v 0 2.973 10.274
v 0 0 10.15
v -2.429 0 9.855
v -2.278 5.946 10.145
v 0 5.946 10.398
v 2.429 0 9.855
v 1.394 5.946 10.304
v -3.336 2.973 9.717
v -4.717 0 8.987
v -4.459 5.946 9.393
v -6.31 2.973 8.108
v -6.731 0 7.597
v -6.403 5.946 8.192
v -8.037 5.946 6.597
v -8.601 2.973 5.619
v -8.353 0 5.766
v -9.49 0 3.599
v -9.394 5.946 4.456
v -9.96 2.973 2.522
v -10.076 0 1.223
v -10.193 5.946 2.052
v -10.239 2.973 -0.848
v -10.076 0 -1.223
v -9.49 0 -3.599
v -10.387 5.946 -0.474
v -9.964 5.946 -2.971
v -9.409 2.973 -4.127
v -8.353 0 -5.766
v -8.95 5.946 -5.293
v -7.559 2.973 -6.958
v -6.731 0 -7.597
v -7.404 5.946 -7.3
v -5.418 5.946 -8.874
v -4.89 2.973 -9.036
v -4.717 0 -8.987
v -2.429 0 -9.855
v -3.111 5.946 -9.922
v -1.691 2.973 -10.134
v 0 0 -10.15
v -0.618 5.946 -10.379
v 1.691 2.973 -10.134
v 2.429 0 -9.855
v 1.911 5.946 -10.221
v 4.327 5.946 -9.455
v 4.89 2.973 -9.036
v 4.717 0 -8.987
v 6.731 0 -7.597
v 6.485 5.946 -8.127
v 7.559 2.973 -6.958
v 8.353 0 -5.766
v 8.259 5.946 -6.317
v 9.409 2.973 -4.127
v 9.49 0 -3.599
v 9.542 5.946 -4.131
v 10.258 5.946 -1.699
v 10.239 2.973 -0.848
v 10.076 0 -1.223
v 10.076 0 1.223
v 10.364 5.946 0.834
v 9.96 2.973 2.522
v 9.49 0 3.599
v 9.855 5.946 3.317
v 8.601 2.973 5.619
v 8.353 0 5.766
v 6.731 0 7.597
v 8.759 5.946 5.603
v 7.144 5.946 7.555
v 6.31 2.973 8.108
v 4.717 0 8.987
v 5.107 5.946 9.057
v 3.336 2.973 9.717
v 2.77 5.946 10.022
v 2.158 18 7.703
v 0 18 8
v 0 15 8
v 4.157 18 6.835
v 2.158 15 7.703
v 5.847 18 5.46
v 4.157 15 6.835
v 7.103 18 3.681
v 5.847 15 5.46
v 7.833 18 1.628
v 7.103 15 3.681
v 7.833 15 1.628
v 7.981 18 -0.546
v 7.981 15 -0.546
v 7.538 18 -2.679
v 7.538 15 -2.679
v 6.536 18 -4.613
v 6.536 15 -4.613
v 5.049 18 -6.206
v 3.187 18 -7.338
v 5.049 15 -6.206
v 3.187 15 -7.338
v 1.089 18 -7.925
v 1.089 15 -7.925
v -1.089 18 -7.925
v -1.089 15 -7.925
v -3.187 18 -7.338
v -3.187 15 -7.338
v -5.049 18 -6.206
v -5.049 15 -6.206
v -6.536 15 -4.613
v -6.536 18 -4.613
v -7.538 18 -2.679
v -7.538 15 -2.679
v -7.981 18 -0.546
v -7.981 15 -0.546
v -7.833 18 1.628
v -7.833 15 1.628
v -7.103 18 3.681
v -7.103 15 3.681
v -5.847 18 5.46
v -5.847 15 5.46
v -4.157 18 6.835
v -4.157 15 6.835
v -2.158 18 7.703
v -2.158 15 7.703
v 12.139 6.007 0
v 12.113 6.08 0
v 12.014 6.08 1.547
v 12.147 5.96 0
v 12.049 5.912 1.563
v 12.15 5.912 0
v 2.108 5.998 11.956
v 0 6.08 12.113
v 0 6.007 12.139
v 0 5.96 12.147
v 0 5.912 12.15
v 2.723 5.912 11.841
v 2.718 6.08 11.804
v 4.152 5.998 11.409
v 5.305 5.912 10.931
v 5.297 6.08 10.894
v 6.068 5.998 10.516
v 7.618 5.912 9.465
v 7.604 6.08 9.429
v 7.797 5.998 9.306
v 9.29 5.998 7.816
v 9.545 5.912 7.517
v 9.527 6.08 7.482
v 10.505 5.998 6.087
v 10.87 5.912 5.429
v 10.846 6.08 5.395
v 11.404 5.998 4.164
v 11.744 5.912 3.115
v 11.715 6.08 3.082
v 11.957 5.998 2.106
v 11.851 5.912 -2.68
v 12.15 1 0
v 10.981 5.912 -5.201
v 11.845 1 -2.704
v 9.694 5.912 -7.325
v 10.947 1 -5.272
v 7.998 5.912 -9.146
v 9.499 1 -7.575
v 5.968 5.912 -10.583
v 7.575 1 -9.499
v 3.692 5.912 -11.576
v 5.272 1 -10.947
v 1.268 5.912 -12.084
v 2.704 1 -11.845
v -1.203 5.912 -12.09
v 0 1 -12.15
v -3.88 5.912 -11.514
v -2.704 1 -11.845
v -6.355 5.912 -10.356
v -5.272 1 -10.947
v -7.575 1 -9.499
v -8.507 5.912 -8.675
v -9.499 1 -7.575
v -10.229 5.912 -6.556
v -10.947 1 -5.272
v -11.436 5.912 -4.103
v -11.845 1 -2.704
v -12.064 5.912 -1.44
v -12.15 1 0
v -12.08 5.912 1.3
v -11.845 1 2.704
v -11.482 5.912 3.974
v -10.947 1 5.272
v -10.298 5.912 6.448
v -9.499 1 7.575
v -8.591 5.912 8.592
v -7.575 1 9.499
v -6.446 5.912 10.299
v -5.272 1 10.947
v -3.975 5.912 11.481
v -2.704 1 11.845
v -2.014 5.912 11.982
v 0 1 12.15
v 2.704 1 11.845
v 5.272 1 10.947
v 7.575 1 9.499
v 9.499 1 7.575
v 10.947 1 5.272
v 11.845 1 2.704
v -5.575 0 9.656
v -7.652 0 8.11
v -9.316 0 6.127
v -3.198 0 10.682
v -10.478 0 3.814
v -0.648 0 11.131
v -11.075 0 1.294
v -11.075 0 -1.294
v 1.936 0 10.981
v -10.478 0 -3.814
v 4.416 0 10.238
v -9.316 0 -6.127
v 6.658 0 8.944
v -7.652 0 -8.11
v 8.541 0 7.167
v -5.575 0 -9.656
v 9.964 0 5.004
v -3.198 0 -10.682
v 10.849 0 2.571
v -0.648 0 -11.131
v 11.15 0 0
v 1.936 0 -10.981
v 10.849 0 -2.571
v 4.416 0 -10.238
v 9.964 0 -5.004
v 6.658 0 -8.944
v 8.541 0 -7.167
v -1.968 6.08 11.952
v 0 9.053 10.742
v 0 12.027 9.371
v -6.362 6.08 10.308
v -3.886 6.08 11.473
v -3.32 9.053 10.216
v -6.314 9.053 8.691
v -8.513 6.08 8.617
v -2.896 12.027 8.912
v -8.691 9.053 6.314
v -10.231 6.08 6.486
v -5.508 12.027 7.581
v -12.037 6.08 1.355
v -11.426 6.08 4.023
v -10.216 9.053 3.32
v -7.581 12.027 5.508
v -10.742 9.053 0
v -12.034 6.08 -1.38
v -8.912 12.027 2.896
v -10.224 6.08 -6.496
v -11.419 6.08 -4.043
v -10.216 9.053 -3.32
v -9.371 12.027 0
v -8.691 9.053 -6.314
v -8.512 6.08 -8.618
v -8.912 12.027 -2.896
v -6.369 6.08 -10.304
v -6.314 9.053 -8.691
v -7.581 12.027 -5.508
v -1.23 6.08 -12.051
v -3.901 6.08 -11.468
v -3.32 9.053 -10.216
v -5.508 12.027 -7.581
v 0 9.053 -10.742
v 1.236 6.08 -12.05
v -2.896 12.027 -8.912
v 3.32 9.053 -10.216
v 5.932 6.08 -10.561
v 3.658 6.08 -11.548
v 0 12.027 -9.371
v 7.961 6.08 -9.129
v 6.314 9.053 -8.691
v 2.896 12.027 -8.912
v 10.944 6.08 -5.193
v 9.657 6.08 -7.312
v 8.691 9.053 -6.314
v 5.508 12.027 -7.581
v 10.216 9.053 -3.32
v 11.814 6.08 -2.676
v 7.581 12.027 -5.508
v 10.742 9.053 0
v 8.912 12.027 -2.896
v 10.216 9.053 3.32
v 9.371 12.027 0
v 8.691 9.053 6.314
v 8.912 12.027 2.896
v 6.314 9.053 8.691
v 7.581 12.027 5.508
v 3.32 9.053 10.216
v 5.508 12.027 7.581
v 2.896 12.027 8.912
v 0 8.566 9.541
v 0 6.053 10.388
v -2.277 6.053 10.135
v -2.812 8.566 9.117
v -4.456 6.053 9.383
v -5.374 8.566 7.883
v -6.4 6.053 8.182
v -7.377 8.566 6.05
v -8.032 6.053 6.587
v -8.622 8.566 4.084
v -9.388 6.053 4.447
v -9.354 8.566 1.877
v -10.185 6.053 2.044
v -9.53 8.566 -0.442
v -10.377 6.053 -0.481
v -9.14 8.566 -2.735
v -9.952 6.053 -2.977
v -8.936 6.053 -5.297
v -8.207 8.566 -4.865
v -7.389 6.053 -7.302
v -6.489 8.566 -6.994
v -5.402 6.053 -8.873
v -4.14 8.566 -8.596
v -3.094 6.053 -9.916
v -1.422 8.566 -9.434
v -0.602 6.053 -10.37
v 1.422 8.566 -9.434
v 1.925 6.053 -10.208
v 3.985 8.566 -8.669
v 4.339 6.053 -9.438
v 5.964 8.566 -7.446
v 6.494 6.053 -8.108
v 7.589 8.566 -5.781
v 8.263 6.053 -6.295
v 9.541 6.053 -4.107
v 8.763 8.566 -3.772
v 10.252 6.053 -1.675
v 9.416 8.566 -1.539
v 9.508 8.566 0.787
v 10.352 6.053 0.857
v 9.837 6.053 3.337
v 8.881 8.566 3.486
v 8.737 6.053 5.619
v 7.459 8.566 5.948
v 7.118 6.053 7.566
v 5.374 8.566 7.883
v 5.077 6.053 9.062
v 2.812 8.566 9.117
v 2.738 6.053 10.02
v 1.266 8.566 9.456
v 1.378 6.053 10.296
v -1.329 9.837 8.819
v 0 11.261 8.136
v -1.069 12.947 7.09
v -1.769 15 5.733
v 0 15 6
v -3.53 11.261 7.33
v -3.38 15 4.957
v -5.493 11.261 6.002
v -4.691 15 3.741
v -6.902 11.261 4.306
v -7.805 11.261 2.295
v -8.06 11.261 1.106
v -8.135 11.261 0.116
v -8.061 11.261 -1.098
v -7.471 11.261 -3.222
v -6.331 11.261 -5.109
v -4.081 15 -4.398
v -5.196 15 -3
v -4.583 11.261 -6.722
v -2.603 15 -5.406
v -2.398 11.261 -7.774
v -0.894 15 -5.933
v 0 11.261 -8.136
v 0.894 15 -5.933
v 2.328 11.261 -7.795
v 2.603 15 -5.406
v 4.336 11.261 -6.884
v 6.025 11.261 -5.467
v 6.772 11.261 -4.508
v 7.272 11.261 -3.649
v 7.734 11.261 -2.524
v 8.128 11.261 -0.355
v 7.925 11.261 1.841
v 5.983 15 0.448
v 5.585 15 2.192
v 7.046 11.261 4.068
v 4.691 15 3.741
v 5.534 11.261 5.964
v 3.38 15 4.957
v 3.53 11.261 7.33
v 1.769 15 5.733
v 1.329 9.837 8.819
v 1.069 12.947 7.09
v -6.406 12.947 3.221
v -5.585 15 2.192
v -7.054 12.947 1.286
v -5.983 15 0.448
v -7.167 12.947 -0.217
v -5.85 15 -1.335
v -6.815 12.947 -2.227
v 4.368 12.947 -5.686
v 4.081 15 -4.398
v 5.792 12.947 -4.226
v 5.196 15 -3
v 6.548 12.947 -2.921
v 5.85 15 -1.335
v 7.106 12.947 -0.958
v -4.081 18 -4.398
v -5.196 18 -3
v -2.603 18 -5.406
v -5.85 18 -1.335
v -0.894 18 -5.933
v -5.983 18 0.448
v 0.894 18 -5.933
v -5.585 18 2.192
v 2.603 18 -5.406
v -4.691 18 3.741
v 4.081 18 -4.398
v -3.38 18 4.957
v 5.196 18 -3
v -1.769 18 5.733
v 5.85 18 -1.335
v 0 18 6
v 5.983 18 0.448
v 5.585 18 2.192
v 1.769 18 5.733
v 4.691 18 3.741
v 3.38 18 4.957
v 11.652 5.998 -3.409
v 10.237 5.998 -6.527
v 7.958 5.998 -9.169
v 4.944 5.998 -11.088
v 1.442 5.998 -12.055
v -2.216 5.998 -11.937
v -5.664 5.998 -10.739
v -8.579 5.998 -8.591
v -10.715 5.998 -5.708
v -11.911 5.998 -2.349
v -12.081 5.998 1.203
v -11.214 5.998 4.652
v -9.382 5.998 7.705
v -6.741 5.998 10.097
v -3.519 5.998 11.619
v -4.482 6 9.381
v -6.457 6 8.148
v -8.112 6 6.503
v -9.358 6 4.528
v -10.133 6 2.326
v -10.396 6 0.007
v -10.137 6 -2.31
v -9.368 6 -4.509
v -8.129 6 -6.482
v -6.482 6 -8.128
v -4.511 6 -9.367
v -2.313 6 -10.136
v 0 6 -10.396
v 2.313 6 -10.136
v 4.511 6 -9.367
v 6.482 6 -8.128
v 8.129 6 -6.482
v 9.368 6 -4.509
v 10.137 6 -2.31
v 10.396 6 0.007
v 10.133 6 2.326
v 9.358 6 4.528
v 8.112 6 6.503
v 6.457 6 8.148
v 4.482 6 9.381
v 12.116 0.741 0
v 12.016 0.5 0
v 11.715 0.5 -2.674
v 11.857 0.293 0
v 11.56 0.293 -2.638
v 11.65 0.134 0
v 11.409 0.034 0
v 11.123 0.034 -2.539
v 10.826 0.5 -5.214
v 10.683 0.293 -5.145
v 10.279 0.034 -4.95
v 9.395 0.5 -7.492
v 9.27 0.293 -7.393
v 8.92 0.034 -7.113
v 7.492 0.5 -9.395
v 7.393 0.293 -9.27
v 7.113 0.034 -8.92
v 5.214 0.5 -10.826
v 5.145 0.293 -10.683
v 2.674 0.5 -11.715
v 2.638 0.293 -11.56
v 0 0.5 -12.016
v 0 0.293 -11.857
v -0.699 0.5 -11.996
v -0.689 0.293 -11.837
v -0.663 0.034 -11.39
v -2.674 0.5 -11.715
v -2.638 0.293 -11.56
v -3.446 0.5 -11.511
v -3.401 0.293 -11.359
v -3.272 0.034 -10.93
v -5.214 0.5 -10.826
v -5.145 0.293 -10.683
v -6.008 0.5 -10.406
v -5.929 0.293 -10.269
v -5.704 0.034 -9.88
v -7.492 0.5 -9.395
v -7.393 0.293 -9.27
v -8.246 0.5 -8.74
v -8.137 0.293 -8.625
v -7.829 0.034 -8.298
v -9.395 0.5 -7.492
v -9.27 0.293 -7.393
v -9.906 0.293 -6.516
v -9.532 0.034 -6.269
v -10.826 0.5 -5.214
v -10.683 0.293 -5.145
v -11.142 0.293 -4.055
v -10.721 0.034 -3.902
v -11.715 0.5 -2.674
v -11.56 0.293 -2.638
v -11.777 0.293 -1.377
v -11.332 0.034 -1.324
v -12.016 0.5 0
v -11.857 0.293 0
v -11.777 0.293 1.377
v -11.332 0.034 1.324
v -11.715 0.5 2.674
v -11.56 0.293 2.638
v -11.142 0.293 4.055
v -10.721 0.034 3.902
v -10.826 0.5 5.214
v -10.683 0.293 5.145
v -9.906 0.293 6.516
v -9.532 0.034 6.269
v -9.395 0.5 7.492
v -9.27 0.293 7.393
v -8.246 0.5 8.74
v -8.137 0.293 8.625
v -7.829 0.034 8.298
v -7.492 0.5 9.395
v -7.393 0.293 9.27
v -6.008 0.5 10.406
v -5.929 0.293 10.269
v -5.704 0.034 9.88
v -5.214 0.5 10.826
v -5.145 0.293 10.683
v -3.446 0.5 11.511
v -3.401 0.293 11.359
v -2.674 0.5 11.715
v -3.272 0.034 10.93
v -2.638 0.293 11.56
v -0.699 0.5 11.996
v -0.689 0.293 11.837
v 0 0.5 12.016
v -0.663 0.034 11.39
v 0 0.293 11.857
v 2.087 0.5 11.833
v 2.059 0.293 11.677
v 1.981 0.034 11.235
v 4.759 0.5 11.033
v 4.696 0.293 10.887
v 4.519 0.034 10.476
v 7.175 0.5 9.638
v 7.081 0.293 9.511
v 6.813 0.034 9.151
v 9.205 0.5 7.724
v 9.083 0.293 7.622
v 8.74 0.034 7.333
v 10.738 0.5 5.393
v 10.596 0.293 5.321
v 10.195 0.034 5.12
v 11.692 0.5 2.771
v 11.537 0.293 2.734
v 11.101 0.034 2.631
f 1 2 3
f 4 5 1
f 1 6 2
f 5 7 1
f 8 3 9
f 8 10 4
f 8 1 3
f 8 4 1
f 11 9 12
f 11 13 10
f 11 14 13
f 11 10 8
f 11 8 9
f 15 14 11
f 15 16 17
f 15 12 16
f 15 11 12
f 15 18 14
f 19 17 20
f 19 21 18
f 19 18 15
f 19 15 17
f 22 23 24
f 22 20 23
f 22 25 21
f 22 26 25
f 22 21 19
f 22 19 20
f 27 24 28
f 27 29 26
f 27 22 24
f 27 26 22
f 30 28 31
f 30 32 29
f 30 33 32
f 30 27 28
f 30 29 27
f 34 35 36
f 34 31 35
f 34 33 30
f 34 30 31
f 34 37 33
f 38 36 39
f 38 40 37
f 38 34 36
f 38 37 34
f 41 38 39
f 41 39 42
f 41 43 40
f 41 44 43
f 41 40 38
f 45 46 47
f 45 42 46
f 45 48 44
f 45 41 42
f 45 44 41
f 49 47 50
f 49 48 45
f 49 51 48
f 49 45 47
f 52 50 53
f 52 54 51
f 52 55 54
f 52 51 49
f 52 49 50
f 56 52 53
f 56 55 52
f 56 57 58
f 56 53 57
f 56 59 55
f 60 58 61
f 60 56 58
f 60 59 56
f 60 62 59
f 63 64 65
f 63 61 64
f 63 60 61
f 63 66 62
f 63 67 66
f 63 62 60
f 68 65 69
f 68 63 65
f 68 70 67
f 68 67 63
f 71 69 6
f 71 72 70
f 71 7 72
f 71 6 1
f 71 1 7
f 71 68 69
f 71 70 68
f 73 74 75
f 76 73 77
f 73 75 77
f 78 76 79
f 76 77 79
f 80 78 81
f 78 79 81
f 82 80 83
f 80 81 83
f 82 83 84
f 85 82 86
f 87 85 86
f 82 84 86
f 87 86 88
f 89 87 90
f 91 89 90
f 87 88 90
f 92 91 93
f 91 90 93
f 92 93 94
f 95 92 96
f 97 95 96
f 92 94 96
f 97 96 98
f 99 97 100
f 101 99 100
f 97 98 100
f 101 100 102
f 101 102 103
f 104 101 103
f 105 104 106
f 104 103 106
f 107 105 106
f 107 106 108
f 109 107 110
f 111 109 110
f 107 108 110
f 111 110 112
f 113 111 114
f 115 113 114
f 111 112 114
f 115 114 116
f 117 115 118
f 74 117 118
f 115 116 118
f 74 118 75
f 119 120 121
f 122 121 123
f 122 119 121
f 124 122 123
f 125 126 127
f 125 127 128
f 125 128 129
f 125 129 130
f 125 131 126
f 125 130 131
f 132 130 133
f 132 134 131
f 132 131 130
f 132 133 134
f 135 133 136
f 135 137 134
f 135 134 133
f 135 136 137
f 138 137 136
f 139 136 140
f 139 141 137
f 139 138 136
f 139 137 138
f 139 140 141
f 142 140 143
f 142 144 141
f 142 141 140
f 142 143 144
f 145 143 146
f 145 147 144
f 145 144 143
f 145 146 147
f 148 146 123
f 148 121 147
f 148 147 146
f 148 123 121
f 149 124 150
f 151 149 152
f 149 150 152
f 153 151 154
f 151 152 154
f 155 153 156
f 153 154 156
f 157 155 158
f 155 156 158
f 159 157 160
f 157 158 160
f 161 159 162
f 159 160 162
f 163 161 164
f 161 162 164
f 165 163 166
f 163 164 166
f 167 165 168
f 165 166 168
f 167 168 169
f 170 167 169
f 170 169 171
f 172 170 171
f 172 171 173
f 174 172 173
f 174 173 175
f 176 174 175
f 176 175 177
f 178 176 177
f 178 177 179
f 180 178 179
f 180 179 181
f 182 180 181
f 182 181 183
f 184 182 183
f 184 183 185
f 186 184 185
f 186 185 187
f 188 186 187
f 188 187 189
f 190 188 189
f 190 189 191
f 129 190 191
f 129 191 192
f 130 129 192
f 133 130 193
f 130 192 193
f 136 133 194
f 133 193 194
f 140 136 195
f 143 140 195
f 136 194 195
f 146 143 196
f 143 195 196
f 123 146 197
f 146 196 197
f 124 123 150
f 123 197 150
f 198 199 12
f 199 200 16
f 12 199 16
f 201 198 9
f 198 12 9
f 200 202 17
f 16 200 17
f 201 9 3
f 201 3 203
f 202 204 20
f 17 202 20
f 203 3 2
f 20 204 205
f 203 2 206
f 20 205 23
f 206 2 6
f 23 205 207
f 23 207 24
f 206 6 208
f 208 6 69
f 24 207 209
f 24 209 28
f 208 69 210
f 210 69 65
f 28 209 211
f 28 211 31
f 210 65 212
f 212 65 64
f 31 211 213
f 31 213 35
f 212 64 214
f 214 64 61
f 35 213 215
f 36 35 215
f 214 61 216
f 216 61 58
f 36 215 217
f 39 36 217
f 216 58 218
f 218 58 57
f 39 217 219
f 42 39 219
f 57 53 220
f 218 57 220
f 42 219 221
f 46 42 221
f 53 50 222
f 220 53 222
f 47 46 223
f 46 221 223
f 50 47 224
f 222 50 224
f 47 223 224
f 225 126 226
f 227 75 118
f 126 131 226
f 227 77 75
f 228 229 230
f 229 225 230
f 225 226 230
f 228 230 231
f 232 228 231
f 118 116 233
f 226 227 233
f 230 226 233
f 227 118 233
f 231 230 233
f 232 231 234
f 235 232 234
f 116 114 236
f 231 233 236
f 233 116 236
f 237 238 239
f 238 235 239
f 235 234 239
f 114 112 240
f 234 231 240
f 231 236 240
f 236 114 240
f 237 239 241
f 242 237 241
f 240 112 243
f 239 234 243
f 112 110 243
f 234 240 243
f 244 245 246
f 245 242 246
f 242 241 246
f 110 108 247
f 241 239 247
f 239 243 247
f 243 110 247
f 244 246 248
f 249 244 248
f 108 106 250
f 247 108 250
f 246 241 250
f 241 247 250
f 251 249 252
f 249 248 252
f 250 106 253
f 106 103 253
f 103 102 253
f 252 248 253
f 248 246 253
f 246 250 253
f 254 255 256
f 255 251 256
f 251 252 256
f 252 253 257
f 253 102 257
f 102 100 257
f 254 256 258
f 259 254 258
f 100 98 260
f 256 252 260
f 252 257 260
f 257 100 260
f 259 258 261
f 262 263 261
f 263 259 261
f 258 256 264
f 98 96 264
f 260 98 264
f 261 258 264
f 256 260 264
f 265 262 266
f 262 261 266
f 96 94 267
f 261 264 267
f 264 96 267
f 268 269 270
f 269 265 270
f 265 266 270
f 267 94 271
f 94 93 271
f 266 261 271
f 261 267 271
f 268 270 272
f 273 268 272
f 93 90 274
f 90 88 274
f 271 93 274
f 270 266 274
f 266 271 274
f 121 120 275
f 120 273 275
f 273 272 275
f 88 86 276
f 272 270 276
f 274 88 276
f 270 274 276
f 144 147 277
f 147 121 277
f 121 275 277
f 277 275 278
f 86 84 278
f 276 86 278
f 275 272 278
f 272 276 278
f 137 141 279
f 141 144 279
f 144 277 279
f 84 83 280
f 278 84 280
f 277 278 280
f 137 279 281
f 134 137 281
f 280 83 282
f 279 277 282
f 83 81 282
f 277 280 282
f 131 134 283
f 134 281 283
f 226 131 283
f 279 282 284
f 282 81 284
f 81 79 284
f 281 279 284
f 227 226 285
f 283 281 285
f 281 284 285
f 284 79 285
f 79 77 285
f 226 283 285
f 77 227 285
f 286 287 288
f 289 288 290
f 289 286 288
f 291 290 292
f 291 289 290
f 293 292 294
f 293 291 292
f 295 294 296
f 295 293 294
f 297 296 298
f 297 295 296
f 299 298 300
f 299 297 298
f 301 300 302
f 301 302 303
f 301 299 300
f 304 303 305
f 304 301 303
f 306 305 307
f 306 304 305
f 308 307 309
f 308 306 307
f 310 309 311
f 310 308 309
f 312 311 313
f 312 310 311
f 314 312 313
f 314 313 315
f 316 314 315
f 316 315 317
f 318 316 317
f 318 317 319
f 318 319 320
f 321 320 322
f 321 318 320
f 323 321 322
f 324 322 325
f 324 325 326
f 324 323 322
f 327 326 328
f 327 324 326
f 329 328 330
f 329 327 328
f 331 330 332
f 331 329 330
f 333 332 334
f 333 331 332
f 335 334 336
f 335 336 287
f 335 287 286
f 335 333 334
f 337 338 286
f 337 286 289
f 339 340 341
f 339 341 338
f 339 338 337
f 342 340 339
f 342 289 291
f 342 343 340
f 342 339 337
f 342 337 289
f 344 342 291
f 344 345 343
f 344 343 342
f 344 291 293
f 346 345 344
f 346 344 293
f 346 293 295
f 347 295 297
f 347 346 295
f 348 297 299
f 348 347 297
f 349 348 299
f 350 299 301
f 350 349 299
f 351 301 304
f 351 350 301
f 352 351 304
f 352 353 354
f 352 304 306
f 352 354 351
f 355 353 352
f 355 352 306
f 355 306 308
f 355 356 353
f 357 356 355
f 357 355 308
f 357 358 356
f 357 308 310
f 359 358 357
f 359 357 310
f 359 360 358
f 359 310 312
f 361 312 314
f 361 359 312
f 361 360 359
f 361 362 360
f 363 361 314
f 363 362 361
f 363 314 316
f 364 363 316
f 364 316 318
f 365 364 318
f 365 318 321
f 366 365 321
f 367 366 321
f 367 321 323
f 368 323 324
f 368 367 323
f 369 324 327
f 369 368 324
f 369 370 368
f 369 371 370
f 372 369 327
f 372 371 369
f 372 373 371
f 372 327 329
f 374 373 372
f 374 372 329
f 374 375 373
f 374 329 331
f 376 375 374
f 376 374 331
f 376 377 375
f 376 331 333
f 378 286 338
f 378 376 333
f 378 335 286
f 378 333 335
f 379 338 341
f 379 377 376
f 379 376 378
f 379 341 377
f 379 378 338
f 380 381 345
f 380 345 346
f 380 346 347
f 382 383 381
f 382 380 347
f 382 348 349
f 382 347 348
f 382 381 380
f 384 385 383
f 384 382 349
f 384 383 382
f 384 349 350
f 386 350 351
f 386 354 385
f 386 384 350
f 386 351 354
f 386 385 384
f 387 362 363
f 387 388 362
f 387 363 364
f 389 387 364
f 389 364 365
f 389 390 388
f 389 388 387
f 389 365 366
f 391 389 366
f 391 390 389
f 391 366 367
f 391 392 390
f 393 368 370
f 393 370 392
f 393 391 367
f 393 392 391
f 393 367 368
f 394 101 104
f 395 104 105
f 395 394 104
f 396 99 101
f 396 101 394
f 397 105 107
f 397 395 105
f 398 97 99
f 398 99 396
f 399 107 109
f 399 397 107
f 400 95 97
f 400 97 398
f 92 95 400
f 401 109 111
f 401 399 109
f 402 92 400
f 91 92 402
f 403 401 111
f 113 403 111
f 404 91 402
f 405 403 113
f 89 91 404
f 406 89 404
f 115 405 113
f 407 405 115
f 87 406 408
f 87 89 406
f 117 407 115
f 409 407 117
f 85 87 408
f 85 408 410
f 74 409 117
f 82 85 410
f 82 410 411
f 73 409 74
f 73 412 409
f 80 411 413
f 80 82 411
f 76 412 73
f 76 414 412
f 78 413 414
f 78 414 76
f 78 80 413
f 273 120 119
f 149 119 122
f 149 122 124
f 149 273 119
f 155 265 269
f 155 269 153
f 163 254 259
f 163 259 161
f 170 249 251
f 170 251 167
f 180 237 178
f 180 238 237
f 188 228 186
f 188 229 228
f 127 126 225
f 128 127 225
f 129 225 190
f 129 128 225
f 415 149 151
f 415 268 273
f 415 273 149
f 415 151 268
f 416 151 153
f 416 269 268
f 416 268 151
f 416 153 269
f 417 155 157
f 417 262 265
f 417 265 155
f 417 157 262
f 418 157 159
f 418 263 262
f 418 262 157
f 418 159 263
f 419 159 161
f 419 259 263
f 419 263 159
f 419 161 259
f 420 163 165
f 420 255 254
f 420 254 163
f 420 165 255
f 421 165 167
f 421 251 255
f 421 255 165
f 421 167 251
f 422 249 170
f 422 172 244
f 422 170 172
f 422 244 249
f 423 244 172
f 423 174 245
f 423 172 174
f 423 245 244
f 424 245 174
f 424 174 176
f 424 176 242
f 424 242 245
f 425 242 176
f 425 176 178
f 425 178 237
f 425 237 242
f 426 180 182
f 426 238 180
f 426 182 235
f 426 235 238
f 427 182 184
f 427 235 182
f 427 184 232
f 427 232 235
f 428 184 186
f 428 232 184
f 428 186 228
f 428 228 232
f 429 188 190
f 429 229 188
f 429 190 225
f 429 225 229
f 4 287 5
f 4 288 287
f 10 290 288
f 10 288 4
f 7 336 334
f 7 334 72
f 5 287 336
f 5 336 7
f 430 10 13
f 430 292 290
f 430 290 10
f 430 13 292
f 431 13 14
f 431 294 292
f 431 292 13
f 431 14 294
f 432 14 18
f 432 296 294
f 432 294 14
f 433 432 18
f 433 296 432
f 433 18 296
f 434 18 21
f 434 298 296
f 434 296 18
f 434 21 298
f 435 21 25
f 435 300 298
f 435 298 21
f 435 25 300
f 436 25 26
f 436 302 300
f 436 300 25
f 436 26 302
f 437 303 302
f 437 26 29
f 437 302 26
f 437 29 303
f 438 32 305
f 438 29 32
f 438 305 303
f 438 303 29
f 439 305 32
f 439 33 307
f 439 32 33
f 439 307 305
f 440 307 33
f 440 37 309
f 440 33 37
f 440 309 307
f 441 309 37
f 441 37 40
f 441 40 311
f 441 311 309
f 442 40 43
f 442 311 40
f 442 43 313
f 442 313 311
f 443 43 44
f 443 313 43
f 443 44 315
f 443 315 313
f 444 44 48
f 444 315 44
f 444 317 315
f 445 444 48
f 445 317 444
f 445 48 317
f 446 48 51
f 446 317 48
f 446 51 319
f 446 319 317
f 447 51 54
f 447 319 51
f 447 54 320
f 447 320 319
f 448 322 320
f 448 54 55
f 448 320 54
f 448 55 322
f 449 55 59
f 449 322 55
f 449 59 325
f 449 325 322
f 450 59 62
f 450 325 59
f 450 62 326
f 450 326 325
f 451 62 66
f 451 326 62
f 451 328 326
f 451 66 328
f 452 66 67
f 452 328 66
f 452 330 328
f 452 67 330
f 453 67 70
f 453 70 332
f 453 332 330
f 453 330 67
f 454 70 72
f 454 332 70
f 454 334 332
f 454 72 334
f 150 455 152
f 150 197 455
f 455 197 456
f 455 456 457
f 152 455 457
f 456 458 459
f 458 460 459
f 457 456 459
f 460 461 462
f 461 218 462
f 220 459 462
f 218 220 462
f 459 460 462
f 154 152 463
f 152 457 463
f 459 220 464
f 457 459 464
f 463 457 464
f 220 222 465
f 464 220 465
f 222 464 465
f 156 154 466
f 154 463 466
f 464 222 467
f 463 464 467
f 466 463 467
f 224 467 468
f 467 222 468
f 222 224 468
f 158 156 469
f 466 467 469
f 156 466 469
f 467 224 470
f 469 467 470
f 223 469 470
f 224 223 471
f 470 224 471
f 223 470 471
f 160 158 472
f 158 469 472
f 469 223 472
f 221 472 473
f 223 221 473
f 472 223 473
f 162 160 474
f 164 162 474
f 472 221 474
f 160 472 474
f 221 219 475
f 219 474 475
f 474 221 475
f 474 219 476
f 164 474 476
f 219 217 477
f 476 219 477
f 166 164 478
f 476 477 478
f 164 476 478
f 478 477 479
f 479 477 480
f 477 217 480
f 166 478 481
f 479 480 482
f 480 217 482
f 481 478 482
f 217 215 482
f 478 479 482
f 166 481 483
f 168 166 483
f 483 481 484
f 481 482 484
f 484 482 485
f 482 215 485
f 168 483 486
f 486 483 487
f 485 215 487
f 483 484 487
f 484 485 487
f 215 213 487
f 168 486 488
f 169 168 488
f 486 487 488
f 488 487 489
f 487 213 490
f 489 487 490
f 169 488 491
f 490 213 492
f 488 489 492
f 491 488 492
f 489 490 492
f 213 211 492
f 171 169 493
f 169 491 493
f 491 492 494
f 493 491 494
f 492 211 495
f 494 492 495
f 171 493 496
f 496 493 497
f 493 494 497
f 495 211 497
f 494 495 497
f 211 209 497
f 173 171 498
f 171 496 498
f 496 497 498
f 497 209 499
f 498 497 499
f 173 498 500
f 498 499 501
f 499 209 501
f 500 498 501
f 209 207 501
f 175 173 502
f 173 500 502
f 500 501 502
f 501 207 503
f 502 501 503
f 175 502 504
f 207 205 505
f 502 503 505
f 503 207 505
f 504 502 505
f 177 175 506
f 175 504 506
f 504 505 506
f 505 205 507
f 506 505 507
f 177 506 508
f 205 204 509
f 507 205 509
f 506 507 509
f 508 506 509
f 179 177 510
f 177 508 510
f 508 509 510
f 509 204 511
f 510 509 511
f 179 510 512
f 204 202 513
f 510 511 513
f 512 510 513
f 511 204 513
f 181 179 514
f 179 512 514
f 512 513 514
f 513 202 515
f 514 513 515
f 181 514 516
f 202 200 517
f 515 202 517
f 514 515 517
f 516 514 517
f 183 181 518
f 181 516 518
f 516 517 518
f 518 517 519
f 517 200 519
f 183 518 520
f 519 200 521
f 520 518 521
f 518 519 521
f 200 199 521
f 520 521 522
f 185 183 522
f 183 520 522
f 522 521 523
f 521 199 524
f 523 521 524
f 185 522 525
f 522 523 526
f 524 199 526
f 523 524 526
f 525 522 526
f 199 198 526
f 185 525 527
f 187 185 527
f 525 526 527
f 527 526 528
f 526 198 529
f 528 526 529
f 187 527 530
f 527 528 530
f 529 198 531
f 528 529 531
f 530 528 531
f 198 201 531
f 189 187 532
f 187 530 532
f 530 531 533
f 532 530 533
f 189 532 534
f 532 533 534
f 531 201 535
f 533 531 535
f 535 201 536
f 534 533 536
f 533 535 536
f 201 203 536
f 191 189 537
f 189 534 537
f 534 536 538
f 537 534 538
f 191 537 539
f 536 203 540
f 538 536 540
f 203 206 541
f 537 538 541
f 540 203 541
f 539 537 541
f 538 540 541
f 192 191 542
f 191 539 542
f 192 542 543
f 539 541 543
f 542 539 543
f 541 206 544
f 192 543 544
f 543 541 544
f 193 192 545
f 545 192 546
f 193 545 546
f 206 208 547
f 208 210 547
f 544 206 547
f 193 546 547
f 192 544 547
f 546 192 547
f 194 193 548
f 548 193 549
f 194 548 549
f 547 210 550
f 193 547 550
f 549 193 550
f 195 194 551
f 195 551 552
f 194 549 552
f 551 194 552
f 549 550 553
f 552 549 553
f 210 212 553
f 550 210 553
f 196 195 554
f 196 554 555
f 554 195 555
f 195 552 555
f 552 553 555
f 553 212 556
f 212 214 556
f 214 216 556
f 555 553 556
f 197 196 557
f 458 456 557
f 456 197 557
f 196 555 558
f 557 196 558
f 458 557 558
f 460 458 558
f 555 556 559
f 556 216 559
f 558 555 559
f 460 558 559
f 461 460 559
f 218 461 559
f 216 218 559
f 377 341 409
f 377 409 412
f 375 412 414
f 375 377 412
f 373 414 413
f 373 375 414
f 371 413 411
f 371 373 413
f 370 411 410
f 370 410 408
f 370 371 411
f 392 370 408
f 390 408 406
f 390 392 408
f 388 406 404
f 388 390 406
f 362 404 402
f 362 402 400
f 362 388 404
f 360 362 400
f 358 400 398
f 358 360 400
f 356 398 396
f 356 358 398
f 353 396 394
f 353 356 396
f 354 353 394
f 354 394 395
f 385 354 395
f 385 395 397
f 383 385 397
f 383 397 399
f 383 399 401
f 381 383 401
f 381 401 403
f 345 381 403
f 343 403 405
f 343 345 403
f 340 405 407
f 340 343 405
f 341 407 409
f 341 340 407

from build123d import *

# Parameters (mm, degrees)
SZKIC1_R                          = 12.15
SZKIC1_R_2                        = 10.15
WYCI_GNI_CIE_CIENKA_CIANKA1_DEPTH = 6
ZAOKR_GLENIE2_R                   = 1
ZAOKR_GLENIE3_R                   = 0.4
SZKIC6_R                          = 8
SZKIC6_R_2                        = 6
DODANIE_WYCI_GNI_CIE1_DEPTH       = 3


with BuildPart() as part:
    # Szkic1 → Wyciągnięcie-cienka ścianka1 (new body)
    with BuildSketch(Plane(origin=(0, 0, 0), x_dir=(1, 0, 0), z_dir=(0, 1, 0))):
        Circle(SZKIC1_R)
        Circle(SZKIC1_R_2, mode=Mode.SUBTRACT)
    extrude(amount=WYCI_GNI_CIE_CIENKA_CIANKA1_DEPTH)

    # Zaokrąglenie2
    zaokr_glenie2_edges = [part.edges().sort_by_distance(p)[0] for p in [
        (-12.15, 0, 0),
    ]]
    fillet(zaokr_glenie2_edges, radius=ZAOKR_GLENIE2_R)

    # Szkic4 → Wycięcie-obrót1 (revolve, cut)
    with BuildSketch(Plane(origin=(0, 0, 0), x_dir=(0, 0, -1), z_dir=(1, 0, 0)), mode=Mode.PRIVATE) as wyci_cie_obr_t1_sk:
        Polygon((0, 0), (10.15, 0), (10.4, 6), (0, 6), align=None)
    revolve(wyci_cie_obr_t1_sk.sketch.rotate(Axis((0, 6, 0), (0, -1, 0)), 180), axis=Axis((0, 6, 0), (0, -1, 0)), mode=Mode.SUBTRACT)

    # Szkic5 → Obrót1 (revolve)
    with BuildSketch(Plane(origin=(0, 0, 0), x_dir=(0, 0, -1), z_dir=(1, 0, 0)), mode=Mode.PRIVATE) as obr_t1_sk:
        with BuildLine():
            add(Edge.make_bspline(
                [(10.4, 6), (9.777490232, 8.738978154), (8.575284138, 10.423413973), (6, 15)],
                knots=[0, 0, 0, 0, 1, 1, 1, 1], degree=3))
            Line((10.4, 6), (12.15, 6))
            Line((12.15, 6), (8, 15))
            Line((8, 15), (6, 15))
        make_face()
    revolve(obr_t1_sk.sketch.rotate(Axis((0, 15, 0), (0, -1, 0)), 180), axis=Axis((0, 15, 0), (0, -1, 0)))

    # Zaokrąglenie3
    zaokr_glenie3_edges = [part.edges().sort_by_distance(p)[0] for p in [
        (0, 6, -10.4),
        (8.591347391, 6, 8.591347391),
    ]]
    fillet(zaokr_glenie3_edges, radius=ZAOKR_GLENIE3_R)

    # Szkic6 → Dodanie-wyciągnięcie1 (add)
    with BuildSketch(Plane(origin=(0, 15, 0), x_dir=(1, 0, 0), z_dir=(0, 1, 0))):
        with Locations(Location((0, 0, 0), (0, 0, 270))):
            Circle(SZKIC6_R)
        with Locations(Location((0, 0, 0), (0, 0, 270))):
            Circle(SZKIC6_R_2, mode=Mode.SUBTRACT)
    extrude(amount=DODANIE_WYCI_GNI_CIE1_DEPTH)


solid = part.part
